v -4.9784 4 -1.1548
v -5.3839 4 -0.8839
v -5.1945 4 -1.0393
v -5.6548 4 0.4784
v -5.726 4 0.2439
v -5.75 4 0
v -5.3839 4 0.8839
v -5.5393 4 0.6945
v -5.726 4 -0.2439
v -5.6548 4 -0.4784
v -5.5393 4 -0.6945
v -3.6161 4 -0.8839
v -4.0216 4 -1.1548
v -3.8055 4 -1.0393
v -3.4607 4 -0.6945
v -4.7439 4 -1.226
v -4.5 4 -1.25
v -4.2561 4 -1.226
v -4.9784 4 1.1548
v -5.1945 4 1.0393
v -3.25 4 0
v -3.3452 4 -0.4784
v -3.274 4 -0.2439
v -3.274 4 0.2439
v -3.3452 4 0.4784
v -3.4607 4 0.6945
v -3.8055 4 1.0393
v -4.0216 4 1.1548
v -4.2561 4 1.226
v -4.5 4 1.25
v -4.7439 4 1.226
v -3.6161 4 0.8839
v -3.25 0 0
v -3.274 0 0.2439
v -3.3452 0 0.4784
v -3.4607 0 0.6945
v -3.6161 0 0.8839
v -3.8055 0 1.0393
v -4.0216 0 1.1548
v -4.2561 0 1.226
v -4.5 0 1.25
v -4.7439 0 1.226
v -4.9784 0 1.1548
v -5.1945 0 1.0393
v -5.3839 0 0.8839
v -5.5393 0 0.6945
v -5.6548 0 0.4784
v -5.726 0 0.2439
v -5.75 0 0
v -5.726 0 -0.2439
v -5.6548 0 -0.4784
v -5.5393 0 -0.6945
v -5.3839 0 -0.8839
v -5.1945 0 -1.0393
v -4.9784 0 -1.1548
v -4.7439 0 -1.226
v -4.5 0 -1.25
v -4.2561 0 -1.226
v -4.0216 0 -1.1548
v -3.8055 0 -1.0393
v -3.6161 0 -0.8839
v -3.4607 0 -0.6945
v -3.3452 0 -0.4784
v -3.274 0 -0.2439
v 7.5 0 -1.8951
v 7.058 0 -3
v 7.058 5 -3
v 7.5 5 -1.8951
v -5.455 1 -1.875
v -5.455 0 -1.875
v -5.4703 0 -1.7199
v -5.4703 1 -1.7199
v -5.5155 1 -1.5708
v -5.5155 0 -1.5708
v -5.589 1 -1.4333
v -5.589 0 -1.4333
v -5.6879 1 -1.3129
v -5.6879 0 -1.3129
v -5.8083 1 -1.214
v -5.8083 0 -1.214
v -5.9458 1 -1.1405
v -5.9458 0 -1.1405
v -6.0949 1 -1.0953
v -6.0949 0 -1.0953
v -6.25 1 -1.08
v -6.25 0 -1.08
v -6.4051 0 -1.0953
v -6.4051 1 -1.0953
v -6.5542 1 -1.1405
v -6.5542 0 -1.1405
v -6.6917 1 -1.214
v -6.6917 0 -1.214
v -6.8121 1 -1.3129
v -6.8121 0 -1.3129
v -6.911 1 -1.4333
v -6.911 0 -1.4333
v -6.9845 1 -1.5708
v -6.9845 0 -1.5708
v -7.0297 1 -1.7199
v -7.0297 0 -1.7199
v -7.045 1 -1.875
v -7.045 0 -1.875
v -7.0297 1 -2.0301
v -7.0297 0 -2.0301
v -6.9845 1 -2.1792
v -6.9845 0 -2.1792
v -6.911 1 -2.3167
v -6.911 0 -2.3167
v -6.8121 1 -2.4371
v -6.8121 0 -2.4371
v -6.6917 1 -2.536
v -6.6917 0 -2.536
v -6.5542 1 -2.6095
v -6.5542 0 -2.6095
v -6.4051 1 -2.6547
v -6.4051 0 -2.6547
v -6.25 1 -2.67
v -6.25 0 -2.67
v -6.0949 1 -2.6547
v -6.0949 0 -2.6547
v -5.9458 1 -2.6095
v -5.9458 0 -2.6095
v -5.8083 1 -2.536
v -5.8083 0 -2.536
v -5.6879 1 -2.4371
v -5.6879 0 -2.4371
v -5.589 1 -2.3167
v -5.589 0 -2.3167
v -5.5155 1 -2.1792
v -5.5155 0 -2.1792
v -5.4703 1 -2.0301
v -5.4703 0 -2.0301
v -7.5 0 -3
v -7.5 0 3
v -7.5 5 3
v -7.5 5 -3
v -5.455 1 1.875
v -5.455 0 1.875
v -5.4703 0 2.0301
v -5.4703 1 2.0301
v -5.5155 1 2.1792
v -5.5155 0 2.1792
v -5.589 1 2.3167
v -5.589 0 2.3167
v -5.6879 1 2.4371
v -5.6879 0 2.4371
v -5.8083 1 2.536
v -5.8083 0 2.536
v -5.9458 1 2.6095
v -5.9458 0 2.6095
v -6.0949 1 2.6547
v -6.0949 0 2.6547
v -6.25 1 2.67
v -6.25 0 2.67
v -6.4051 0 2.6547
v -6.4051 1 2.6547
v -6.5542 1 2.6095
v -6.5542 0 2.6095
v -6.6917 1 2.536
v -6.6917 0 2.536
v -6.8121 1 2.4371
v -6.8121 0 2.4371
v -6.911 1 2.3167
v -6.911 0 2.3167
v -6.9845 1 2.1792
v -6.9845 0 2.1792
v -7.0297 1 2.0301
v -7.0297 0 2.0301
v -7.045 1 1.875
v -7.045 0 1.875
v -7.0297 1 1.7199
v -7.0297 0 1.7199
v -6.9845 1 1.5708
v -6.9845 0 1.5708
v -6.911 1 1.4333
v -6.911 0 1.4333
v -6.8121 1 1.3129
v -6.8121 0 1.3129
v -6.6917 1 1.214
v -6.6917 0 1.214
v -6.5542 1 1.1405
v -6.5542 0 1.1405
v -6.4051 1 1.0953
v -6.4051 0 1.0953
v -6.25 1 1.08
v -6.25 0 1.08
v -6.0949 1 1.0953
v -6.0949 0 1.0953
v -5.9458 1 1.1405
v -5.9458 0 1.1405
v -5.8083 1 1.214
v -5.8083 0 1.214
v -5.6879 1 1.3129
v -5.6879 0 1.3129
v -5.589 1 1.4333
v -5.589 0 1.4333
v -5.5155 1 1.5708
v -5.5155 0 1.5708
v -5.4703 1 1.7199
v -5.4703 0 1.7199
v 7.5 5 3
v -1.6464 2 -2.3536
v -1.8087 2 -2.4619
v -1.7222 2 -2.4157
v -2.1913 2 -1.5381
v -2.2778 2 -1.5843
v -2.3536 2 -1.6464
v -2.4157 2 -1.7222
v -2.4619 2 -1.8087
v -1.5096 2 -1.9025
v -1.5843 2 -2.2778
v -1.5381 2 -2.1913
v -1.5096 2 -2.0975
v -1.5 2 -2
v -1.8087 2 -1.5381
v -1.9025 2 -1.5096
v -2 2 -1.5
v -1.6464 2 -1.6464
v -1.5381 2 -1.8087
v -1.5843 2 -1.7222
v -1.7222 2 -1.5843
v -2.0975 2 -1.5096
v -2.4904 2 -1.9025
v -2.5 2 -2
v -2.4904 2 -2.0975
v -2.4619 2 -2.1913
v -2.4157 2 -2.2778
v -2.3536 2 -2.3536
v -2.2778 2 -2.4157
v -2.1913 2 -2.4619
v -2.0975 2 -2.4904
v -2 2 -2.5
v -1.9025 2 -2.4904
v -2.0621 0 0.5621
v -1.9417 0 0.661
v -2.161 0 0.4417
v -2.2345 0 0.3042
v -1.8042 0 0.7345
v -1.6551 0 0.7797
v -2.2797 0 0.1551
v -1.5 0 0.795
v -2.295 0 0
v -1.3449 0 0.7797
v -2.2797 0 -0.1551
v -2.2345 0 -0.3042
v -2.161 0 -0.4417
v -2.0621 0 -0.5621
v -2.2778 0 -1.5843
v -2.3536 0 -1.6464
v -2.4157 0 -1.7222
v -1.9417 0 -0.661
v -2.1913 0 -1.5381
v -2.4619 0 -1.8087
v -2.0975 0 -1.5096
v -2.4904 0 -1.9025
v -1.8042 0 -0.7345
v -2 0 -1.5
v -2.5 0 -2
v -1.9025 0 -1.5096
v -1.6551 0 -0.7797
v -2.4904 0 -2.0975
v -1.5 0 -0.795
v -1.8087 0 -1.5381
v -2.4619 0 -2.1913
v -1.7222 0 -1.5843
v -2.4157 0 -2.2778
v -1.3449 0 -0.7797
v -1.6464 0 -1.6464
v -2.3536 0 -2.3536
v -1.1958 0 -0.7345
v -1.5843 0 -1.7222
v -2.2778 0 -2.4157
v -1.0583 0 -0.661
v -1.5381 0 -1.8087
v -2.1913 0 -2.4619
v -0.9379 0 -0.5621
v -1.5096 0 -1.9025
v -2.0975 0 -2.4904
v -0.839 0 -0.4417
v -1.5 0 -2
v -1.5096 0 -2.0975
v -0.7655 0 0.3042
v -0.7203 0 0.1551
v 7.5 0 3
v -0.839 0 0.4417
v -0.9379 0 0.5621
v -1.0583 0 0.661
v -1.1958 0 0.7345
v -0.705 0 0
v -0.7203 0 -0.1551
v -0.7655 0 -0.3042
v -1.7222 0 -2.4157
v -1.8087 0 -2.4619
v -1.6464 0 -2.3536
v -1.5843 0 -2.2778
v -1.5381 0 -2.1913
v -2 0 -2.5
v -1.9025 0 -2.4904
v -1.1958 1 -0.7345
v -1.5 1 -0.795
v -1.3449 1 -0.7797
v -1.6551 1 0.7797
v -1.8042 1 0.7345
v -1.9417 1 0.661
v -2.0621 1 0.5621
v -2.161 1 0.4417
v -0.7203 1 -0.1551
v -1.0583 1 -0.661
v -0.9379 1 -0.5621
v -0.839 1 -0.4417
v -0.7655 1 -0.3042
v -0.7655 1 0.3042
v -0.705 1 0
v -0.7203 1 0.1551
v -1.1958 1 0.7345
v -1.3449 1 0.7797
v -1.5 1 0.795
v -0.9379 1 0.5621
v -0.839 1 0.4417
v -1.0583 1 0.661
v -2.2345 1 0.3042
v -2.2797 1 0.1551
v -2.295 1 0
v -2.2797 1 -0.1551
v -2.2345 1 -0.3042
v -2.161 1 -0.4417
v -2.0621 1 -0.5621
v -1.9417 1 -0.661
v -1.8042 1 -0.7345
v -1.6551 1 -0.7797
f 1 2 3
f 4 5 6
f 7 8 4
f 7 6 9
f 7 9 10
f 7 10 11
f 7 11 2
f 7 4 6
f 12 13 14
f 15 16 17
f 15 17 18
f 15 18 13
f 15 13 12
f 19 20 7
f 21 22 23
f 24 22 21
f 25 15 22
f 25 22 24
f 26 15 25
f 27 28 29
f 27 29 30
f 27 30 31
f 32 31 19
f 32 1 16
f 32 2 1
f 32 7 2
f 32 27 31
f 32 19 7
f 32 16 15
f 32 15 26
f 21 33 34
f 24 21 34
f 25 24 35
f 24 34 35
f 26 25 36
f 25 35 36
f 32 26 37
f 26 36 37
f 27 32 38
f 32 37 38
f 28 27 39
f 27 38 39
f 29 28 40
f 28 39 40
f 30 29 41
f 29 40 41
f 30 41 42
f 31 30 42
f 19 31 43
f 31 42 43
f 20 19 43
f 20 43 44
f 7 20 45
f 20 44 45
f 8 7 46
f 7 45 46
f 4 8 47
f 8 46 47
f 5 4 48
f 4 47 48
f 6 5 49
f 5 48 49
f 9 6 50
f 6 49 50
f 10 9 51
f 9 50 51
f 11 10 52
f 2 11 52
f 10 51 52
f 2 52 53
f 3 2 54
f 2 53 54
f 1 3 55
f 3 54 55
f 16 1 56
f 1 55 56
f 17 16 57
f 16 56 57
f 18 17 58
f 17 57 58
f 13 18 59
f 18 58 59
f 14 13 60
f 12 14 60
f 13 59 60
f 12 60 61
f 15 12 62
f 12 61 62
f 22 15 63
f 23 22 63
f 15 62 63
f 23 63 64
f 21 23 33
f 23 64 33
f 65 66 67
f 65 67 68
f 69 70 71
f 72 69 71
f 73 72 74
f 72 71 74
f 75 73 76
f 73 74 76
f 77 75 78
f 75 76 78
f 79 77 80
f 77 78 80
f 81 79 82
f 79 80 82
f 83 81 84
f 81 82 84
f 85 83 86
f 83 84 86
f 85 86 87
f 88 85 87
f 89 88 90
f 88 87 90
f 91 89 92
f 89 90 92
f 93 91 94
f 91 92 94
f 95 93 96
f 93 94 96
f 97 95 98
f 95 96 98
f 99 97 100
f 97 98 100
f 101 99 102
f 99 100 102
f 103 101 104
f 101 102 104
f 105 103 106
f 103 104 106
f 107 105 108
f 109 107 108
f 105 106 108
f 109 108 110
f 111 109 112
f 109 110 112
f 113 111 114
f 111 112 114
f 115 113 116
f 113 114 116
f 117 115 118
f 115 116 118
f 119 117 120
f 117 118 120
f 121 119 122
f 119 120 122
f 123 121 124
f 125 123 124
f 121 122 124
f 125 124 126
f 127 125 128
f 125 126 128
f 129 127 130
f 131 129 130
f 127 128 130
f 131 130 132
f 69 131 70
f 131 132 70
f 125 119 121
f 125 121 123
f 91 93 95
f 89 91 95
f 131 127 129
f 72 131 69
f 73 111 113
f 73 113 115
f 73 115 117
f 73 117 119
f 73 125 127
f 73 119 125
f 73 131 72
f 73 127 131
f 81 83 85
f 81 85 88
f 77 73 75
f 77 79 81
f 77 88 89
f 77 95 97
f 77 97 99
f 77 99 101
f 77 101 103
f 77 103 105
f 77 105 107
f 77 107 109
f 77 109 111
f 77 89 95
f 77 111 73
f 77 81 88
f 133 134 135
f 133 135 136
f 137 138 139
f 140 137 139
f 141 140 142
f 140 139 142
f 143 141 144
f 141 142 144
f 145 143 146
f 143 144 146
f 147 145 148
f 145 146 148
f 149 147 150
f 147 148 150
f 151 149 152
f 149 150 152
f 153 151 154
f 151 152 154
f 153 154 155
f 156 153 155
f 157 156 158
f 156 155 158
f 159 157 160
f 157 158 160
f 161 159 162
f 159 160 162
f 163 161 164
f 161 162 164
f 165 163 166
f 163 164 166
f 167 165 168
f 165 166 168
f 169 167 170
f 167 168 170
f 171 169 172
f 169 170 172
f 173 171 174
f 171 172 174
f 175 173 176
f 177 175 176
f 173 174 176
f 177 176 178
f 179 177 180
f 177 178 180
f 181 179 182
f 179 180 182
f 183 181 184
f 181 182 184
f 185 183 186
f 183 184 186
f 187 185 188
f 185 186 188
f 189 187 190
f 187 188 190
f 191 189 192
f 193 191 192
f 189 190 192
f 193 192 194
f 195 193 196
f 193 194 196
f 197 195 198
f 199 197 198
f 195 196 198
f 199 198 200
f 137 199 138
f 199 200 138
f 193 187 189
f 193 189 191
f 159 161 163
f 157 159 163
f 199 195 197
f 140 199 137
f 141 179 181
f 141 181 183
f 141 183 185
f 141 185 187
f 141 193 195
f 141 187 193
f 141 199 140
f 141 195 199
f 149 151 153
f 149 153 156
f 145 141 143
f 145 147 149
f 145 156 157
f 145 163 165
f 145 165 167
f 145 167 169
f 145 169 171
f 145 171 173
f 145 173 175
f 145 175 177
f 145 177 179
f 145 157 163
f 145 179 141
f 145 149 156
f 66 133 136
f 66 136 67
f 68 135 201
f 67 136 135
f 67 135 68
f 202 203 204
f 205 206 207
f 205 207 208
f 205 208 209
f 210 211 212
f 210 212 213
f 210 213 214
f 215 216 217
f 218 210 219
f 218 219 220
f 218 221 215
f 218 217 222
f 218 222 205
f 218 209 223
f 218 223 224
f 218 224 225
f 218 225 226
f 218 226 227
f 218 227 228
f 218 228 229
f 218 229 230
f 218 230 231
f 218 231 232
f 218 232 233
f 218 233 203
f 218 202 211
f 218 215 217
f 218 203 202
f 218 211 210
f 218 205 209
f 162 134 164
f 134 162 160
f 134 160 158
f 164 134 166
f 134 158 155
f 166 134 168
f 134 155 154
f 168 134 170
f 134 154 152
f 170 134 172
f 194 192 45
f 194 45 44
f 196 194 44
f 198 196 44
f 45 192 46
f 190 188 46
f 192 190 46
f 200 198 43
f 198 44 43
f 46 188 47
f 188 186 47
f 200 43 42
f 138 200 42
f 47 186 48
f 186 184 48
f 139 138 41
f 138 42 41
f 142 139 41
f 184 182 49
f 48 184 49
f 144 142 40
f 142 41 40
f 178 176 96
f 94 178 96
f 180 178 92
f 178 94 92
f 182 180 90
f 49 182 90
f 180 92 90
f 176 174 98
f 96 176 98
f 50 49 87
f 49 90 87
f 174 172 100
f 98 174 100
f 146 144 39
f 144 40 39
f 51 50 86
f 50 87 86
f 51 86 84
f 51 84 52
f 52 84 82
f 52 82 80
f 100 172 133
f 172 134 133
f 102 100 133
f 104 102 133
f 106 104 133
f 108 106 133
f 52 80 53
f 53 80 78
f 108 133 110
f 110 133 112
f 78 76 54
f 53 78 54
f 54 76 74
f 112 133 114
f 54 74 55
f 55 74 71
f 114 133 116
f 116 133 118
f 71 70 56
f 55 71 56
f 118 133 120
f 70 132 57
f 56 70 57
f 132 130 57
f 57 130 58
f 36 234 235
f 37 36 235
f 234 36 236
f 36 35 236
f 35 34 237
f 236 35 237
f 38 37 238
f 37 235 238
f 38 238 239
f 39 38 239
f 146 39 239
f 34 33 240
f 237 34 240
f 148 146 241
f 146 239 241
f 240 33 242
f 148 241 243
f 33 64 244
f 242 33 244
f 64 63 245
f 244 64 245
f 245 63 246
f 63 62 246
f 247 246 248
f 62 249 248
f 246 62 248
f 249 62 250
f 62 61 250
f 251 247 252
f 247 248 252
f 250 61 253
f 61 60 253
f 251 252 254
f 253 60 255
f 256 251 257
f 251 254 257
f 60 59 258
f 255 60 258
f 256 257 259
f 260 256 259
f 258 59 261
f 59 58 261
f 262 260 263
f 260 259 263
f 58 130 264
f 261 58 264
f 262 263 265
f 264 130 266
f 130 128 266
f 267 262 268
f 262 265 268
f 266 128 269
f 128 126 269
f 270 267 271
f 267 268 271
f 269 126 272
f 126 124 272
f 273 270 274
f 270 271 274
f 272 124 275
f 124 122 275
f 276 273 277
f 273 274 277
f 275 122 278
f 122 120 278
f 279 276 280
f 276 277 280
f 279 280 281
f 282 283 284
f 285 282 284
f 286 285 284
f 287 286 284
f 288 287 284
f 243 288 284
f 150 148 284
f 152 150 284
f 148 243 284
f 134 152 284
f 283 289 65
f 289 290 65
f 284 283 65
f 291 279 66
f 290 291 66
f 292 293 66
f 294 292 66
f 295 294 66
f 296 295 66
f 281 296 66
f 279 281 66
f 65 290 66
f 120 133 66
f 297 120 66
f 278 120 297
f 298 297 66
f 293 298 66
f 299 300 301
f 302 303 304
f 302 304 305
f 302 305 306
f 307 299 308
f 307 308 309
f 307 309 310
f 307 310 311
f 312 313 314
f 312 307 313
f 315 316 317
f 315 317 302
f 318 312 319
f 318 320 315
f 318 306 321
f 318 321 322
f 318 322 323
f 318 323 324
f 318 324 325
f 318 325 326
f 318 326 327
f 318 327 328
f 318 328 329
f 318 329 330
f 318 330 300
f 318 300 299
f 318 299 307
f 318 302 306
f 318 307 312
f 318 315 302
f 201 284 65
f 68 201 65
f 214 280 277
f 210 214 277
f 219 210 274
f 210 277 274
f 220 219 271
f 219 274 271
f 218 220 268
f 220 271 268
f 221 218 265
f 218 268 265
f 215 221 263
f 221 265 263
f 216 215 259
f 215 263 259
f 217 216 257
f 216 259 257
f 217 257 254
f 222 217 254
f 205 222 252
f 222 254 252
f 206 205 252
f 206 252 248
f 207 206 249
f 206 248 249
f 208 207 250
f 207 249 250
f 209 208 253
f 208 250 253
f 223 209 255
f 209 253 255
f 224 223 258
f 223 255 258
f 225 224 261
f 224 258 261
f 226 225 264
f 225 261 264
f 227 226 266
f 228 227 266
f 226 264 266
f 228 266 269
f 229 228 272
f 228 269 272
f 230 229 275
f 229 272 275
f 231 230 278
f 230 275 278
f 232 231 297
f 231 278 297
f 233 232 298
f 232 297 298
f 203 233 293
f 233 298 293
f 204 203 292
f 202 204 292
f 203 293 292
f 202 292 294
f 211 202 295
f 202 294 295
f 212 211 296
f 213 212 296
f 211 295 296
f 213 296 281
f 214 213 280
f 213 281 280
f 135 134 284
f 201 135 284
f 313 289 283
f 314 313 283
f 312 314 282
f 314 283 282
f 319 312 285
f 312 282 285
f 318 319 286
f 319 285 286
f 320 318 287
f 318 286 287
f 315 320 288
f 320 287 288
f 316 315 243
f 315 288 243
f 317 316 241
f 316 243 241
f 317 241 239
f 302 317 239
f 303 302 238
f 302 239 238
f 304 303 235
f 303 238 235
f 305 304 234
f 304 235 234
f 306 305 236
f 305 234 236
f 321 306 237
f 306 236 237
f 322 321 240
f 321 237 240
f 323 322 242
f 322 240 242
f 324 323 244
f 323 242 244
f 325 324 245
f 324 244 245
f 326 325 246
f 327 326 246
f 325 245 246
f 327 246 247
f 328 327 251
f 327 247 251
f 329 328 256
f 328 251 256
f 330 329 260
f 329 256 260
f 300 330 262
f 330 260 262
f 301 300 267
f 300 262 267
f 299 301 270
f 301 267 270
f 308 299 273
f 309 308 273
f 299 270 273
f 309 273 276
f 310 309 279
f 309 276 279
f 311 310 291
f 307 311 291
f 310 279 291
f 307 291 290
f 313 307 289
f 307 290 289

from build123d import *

# Parameters (mm, degrees)
SKETCH1_W              = 15
SKETCH1_H              = 6
MAIN_BODY_DEPTH        = 5
SKETCH3_R              = 1.25
GRIN_HOLE_DEPTH        = 4
SKETCH2_R              = 0.795
MAGNET_HOLES_DEPTH     = 1
SET_SCREW_INDENT_DEPTH = 6
SKETCH5_R              = 0.5
CUT_EXTRUDE1_DEPTH     = 2


with BuildPart() as part:
    # Sketch1 → Main Body (new body)
    with BuildSketch(Plane(origin=(0, 0, 0), x_dir=(1, 0, 0), z_dir=(0, 1, 0))):
        Rectangle(SKETCH1_W, SKETCH1_H)
    extrude(amount=MAIN_BODY_DEPTH)

    # Sketch3 → GRIN Hole (cut)
    with BuildSketch(Plane.XZ):
        with Locations((-4.5, 0)):
            Circle(SKETCH3_R)
    extrude(amount=-GRIN_HOLE_DEPTH, mode=Mode.SUBTRACT)

    # Sketch2 → Magnet Holes (cut)
    with BuildSketch(Plane.XZ):
        with Locations((-6.25, -1.875)):
            Circle(SKETCH2_R)
        with Locations((-6.25, 1.875)):
            Circle(SKETCH2_R)
        with Locations((-1.5, 0)):
            Circle(SKETCH2_R)
    extrude(amount=-MAGNET_HOLES_DEPTH, mode=Mode.SUBTRACT)

    # Sketch4 → Set Screw Indent (cut, through all)
    with BuildSketch(Plane.XZ):
        Polygon((7.058045095, -3), (7.5, -1.895112738), (7.5, -3), align=None)
    extrude(amount=-SET_SCREW_INDENT_DEPTH, mode=Mode.SUBTRACT)

    # Sketch5 → Cut-Extrude1 (cut)
    with BuildSketch(Plane.XZ):
        with Locations((-2, -2)):
            Circle(SKETCH5_R)
    extrude(amount=-CUT_EXTRUDE1_DEPTH, mode=Mode.SUBTRACT)


solid = part.part
